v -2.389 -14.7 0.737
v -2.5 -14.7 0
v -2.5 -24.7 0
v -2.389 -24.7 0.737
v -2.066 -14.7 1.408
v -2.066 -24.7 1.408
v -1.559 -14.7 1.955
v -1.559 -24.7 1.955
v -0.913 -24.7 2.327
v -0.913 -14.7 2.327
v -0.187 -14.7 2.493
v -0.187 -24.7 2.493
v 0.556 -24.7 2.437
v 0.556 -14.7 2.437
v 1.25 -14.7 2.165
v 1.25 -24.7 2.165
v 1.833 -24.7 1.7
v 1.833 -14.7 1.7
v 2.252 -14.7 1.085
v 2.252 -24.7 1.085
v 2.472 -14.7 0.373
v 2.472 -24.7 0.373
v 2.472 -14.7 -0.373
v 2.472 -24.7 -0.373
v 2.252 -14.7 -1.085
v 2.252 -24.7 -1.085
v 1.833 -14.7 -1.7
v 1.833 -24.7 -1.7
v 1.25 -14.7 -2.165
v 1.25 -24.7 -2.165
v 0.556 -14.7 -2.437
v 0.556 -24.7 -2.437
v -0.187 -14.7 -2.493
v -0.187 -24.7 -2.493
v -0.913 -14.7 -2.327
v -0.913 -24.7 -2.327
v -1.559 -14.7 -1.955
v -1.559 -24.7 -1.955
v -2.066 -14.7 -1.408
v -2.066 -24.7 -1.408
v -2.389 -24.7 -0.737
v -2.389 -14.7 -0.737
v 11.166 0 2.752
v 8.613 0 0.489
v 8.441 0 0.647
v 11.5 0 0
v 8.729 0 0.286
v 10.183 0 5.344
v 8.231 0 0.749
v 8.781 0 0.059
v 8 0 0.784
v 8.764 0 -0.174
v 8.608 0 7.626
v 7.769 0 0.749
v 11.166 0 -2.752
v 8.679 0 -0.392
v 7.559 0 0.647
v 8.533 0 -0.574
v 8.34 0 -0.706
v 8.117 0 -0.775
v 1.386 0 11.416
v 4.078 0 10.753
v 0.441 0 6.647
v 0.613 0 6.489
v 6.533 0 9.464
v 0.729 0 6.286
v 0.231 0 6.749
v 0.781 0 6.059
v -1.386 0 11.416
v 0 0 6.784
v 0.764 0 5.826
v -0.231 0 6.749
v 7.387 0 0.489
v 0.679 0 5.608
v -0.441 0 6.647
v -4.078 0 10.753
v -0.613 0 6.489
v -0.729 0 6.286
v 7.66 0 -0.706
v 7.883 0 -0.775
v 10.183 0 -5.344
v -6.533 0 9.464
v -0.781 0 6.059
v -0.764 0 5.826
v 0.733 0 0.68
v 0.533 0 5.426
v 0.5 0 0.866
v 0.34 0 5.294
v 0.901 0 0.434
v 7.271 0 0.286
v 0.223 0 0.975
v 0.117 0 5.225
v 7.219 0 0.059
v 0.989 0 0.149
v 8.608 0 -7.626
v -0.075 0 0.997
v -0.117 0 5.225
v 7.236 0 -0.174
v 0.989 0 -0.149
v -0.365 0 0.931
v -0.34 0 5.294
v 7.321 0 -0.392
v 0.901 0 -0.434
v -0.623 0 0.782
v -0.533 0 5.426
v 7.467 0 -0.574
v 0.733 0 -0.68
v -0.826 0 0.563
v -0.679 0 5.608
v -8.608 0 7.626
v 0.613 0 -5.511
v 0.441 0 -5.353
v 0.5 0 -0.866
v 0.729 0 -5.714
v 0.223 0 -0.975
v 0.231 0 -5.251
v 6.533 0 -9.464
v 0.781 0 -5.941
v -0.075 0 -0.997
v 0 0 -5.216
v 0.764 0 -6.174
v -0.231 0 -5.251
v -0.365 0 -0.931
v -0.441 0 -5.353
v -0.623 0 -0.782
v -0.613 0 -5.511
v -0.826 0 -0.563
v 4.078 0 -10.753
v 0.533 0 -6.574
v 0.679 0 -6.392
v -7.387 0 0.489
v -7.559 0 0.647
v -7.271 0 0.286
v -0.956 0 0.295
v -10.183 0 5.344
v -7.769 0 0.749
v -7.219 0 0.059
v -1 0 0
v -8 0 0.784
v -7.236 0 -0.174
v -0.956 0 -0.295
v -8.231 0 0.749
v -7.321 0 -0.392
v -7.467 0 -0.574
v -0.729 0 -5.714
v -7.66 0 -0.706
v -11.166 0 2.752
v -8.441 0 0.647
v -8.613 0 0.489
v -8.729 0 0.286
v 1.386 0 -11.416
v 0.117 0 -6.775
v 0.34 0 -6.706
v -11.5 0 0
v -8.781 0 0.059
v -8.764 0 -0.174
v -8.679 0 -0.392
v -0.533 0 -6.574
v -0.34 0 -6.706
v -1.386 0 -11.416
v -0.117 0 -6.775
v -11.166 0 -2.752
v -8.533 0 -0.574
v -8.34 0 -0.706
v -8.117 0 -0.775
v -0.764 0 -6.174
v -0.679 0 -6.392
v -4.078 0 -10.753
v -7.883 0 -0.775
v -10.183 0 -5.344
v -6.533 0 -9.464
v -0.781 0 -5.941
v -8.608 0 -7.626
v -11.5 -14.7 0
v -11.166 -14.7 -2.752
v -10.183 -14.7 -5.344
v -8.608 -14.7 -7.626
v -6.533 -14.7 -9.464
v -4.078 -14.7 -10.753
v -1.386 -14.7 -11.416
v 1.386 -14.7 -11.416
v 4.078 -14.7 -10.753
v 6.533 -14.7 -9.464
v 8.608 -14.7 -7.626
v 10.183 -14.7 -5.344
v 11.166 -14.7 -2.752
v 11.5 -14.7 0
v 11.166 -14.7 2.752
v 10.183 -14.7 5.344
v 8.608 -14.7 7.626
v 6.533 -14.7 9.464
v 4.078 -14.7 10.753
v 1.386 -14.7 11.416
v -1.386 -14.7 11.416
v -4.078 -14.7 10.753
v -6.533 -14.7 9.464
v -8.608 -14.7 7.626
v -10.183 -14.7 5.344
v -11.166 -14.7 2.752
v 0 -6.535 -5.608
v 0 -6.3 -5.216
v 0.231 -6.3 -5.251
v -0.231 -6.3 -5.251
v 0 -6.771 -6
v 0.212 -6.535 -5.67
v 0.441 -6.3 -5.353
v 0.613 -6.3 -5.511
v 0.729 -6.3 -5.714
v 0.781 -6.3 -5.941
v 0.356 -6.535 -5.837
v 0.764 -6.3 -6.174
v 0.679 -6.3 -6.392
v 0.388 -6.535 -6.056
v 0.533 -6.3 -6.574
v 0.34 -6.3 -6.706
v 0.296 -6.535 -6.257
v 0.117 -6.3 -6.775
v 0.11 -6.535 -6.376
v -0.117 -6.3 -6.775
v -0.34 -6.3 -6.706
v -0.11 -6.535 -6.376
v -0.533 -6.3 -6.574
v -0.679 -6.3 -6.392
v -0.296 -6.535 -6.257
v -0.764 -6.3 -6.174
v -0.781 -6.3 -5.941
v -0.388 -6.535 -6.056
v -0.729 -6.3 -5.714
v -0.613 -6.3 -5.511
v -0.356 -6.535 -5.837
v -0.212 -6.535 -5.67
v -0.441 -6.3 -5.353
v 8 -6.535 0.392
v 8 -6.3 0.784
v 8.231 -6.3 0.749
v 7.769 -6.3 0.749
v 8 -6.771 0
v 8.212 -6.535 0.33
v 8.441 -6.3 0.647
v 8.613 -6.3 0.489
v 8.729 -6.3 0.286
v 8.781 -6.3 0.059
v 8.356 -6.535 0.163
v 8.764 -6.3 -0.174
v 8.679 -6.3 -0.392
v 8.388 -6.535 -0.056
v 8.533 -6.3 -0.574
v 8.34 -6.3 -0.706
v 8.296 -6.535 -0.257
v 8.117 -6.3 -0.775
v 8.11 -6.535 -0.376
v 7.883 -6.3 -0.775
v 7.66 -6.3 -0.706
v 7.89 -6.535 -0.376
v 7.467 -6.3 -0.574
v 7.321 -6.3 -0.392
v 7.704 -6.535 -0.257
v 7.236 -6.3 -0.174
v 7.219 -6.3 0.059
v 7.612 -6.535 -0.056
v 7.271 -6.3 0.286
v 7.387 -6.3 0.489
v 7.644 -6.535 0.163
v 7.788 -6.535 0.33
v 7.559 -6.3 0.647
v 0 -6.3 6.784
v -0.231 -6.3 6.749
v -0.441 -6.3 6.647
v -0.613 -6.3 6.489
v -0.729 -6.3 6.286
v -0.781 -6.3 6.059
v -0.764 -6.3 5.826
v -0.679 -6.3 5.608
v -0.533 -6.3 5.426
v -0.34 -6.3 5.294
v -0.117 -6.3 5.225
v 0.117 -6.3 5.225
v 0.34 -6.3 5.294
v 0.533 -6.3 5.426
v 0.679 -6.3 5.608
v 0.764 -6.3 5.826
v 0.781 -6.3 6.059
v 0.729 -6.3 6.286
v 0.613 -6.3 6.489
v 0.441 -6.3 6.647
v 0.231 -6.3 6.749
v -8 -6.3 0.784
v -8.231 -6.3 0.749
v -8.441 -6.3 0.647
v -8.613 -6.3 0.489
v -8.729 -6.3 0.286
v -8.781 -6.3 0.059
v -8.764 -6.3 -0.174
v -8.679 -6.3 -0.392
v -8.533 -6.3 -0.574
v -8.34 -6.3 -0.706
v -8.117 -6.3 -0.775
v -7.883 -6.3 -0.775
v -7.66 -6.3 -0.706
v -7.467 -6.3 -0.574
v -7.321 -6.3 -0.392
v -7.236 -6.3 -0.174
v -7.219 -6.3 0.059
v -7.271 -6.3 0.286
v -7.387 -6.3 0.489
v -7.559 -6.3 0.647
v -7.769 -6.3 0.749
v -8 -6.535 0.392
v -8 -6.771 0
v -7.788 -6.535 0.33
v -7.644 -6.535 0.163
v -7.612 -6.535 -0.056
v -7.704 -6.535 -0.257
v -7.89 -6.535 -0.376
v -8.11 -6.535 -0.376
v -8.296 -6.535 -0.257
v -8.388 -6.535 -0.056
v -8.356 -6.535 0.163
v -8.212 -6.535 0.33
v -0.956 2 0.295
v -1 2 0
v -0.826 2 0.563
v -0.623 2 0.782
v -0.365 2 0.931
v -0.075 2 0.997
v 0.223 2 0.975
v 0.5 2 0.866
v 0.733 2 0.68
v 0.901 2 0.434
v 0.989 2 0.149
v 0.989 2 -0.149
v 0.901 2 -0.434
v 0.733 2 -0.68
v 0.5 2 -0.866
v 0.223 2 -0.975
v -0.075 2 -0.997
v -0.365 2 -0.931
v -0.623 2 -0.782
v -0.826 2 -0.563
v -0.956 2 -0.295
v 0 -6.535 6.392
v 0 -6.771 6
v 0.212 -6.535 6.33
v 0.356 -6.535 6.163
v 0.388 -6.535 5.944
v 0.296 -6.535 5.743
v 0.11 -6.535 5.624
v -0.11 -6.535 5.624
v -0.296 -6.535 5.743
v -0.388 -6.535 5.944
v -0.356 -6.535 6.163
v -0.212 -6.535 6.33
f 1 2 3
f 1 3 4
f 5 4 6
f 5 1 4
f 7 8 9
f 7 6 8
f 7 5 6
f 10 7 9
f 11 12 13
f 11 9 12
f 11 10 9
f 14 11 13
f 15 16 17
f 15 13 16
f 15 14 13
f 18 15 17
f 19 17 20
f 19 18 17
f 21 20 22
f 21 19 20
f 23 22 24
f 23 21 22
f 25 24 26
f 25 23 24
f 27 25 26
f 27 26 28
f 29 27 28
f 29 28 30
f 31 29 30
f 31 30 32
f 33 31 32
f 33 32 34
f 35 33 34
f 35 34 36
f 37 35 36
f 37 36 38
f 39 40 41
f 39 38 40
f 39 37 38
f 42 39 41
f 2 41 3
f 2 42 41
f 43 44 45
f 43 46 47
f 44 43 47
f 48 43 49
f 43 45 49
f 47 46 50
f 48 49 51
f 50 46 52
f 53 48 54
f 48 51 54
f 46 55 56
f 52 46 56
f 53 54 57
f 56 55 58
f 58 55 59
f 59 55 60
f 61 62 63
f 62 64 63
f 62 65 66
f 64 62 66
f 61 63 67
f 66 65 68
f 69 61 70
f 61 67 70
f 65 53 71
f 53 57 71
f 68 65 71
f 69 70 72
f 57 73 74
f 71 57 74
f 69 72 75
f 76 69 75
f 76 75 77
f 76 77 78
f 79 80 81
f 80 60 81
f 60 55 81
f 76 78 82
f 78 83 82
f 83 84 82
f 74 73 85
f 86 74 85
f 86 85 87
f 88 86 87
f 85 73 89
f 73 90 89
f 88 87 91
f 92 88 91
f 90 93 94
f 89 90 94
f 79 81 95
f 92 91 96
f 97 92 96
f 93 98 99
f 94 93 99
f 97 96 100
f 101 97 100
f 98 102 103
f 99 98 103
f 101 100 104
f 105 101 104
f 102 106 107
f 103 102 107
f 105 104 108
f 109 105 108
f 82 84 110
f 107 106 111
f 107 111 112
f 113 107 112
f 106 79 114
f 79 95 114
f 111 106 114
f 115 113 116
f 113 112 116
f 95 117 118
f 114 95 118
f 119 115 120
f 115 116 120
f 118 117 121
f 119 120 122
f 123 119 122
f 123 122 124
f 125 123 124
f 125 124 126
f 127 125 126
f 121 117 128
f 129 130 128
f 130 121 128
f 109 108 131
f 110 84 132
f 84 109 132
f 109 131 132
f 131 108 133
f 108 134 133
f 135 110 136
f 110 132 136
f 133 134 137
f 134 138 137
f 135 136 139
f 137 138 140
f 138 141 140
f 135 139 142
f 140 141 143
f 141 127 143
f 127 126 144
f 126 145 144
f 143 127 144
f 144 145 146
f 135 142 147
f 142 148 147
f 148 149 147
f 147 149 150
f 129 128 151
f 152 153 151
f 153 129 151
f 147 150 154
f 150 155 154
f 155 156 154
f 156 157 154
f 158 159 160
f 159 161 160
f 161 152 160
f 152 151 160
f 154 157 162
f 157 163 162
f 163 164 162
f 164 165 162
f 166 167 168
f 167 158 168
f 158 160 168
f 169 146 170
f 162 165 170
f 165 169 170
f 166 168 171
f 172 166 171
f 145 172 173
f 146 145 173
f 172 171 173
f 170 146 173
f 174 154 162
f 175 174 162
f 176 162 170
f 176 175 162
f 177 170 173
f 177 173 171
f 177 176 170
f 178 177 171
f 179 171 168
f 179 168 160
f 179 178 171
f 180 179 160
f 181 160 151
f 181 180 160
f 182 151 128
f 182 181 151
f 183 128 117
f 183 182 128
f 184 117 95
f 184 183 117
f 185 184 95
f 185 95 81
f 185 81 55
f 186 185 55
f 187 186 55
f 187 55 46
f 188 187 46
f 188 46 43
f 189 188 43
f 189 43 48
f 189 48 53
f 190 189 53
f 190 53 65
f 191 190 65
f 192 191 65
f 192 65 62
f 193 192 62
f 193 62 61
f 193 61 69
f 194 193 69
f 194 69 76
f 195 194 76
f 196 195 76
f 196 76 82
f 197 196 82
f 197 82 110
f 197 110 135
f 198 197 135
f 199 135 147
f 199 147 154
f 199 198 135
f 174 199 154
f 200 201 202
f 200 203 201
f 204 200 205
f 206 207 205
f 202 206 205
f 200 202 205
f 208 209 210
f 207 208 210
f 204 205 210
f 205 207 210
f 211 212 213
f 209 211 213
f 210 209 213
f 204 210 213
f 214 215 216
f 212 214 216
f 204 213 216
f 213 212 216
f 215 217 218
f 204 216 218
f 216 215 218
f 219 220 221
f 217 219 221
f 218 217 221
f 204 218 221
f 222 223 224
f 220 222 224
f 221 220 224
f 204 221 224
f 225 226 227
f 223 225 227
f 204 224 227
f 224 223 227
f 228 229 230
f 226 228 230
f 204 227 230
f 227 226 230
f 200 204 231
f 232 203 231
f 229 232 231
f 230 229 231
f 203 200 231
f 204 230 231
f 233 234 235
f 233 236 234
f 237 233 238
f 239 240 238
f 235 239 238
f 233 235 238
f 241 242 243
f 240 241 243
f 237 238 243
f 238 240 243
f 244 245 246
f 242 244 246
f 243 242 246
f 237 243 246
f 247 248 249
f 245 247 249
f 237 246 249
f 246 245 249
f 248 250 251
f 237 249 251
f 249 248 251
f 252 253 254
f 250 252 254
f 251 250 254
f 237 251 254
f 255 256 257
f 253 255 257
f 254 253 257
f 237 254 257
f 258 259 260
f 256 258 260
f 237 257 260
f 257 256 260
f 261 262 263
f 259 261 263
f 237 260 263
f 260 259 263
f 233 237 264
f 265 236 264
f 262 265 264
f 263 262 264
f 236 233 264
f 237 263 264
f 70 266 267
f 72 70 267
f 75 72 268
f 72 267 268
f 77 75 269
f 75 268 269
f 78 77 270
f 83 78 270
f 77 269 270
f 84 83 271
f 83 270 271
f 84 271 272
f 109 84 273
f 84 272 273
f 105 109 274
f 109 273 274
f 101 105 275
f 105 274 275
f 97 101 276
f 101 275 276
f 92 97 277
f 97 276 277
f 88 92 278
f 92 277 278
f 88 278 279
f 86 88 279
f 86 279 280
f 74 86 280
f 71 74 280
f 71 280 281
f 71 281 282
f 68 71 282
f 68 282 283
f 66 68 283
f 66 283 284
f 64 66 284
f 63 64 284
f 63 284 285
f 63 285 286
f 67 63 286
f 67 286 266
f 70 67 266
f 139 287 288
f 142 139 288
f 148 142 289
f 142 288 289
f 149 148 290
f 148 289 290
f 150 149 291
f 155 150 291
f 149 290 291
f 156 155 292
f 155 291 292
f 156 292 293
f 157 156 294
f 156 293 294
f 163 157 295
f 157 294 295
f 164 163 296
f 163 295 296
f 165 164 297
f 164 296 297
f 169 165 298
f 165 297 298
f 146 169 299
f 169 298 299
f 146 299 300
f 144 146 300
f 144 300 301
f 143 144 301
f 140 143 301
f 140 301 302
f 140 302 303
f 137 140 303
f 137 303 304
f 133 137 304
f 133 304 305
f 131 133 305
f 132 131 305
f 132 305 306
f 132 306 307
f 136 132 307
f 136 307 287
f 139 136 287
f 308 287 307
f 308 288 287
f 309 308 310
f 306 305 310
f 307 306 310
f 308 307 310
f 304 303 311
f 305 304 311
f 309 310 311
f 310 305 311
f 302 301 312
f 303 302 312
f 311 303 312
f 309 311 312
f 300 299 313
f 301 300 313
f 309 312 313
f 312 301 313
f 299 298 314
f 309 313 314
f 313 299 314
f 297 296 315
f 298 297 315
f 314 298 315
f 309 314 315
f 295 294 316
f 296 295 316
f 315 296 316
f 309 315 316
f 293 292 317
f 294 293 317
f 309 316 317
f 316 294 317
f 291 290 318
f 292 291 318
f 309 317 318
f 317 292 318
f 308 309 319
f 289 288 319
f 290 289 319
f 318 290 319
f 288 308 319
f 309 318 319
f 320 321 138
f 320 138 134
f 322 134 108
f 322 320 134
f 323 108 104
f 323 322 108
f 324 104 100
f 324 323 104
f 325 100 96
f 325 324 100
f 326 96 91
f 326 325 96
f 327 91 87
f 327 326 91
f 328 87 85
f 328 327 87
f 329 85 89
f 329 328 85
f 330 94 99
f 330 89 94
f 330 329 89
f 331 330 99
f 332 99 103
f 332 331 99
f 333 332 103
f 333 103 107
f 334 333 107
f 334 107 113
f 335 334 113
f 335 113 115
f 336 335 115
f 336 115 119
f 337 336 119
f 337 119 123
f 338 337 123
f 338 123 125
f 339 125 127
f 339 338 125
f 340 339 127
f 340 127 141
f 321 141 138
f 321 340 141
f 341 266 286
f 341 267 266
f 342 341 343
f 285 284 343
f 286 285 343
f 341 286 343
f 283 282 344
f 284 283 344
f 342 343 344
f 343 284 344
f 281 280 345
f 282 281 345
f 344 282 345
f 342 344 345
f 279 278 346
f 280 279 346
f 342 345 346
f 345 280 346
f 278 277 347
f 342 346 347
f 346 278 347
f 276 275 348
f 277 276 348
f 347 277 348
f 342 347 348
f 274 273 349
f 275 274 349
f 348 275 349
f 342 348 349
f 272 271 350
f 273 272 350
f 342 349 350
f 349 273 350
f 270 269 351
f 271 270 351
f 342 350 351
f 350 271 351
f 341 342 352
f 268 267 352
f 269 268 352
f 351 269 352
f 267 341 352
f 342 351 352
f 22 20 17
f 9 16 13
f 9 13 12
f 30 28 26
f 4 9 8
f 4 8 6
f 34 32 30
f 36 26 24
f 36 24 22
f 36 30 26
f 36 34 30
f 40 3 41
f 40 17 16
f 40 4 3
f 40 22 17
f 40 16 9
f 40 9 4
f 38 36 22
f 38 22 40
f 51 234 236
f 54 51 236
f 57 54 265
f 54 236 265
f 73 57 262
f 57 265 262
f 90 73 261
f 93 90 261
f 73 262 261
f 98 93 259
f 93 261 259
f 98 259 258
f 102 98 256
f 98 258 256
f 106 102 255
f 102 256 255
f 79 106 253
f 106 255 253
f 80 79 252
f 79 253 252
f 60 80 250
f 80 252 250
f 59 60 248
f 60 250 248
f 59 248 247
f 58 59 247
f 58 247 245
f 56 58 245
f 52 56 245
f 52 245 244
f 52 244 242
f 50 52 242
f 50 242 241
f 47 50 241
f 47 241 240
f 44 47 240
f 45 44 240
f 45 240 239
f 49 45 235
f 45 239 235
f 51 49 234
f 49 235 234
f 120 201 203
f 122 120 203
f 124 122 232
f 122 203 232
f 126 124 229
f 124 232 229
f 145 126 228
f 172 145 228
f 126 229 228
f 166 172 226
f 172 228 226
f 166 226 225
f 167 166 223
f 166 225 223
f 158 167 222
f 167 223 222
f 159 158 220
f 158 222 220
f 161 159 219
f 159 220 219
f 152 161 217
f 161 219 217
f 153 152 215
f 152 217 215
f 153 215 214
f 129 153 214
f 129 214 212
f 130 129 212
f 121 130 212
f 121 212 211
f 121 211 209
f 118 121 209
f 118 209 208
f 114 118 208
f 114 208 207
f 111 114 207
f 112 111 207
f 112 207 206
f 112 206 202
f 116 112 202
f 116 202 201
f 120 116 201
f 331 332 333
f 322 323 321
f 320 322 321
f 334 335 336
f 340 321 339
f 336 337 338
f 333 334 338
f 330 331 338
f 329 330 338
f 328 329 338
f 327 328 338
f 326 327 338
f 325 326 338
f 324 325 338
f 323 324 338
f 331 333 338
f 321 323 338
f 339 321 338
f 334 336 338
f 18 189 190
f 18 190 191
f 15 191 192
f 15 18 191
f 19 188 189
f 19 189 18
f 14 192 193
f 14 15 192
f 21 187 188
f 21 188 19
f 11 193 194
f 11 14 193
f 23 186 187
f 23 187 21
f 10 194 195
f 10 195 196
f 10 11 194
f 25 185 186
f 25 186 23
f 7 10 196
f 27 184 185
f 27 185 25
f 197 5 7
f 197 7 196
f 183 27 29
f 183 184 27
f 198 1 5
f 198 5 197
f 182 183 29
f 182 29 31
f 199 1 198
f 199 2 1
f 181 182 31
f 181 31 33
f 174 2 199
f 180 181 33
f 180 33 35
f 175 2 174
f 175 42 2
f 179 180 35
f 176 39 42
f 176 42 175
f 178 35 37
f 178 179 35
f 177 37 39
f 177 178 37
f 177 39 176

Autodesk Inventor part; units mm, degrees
ref_plane "YZ Plane" through (0, 0, 0) normal (1, 0, 0) x (0, 1, 0)
ref_plane "XZ Plane" through (0, 0, 0) normal (0, 1, 0) x (-1, 0, 0)
ref_plane "XY Plane" through (0, 0, 0) normal (0, 0, 1) x (1, 0, 0)
sketch "Sketch1" plane through (0, 0, 0) normal (0, 0, 1) x (1, 0, 0)
  line L0 (0, 0) -> (-11.5, 0)
  line L1 (-11.5, 0) -> (-11.5, -24.7)
  line L2 (-11.5, -24.7) -> (0, -24.7)
  line L3 (0, -24.7) -> (0, 0)
  line L4 (0, -24.7) -> (-2.5, -24.7)
  line L5 (-2.5, -24.7) -> (-2.5, -14.7)
  line L6 (-2.5, -14.7) -> (0, -14.7)
  line L7 (0, -14.7) -> (0, -24.7)
  line L8 (0, 0) -> (-1, 0)
  line L9 (-1, 0) -> (-1, 2)
  line L10 (-1, 2) -> (0, 2)
  line L11 (0, 2) -> (0, 0)
  line L12 (0, -14.7) -> (-11.5, -14.7)
  line L13 (-11.5, -14.7) -> (-11.5, 0)
  line L14 (-11.5, 0) -> (0, 0)
  line L15 (0, 0) -> (0, -14.7)
  dimension "d0" = 11.5
  dimension "d1" = 24.7
  dimension "d2" = 2.5
  dimension "d3" = 10
  dimension "d4" = 1
  dimension "d5" = 2
revolve "Revolution1" add sketch "Sketch1" angle 360 about axis through (0, 0, 0) along (0, -1, 0) contours L3 L6 L12 L1 L0 | L0 L9 L10 L11 | L3 L2 L5 L6
thread "Thread1" size "M5x0.8" class "6g" standard "ANSI Metric M Profile" length 7 offset 3
sketch "Sketch2" plane through (0, 0, 0) normal (0, 1, 0) x (1, 0, 0)
  point P0 (0, 0)
  point P1 (8, 0)
  point P2 (-8, 0)
  point P3 (0, -6)
  point P4 (0, 6)
  dimension "d9" = 6
  dimension "d10" = 6
  dimension "d11" = 8
  dimension "d12" = 8
hole "Hole1" at (8, 0, 0) at (-8, 0, 0) at (0, 0, 6) at (0, 0, -6) direction (0, -1, 0) diameter 1.567 depth 6.3 tip angle 118 thread size "M2x0.4" class "6H" standard "ISO Metric profile"
equation "\"d10\" = d9"
equation "\"d12\" = d11"
properties part number "Emax 1806 2280kv"
